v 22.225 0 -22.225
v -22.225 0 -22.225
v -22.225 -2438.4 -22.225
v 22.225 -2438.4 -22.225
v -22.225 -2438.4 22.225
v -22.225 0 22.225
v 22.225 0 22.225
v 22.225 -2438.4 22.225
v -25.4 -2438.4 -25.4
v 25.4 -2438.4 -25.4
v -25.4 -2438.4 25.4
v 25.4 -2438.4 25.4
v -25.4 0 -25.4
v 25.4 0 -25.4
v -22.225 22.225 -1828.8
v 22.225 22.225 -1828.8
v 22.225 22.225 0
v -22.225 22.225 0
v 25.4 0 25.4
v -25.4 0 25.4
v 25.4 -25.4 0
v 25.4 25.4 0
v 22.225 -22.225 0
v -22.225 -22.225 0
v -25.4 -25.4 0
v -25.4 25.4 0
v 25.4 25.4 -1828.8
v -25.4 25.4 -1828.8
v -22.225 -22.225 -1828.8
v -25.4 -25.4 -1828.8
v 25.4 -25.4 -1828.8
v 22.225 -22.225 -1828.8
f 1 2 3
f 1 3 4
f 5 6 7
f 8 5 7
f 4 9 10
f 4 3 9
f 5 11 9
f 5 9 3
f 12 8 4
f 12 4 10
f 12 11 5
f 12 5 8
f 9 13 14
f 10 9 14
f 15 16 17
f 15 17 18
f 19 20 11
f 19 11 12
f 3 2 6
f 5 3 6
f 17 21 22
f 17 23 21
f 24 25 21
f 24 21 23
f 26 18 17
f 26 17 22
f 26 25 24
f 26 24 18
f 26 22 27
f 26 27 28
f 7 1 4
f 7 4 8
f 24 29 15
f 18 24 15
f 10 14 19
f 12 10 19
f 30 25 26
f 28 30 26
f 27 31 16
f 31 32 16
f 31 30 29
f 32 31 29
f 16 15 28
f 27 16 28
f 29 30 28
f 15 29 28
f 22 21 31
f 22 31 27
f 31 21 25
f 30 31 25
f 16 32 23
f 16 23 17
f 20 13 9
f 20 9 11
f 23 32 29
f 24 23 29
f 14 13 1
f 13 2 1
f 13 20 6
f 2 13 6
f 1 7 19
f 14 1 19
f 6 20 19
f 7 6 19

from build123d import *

# Parameters (mm, degrees)
SKETCH_W            = 50.8
SKETCH_H            = 50.8
SKETCH_W_2          = 44.45
SKETCH_H_2          = 44.45
PAD_DEPTH           = 2438.4
SKETCHBINDER001_W   = 50.8
SKETCHBINDER001_H   = 50.8
SKETCHBINDER001_W_2 = 44.45
SKETCHBINDER001_H_2 = 44.45
PAD6FT_DEPTH        = 1828.8


with BuildPart() as f_8_tubing:
    # Sketch → Pad (new body)
    with BuildSketch(Plane.XZ):
        Rectangle(SKETCH_W, SKETCH_H)
        Rectangle(SKETCH_W_2, SKETCH_H_2, mode=Mode.SUBTRACT)
    extrude(amount=PAD_DEPTH)


with BuildPart() as f_6_tubing:
    # SketchBinder001 → Pad6ft (new body)
    with BuildSketch(Plane(origin=(0, 0, 0), x_dir=(0, 1, 0), z_dir=(0, 0, 1))):
        Rectangle(SKETCHBINDER001_W, SKETCHBINDER001_H)
        Rectangle(SKETCHBINDER001_W_2, SKETCHBINDER001_H_2, mode=Mode.SUBTRACT)
    extrude(amount=-PAD6FT_DEPTH)


solid = Compound([f_8_tubing.part, f_6_tubing.part])
